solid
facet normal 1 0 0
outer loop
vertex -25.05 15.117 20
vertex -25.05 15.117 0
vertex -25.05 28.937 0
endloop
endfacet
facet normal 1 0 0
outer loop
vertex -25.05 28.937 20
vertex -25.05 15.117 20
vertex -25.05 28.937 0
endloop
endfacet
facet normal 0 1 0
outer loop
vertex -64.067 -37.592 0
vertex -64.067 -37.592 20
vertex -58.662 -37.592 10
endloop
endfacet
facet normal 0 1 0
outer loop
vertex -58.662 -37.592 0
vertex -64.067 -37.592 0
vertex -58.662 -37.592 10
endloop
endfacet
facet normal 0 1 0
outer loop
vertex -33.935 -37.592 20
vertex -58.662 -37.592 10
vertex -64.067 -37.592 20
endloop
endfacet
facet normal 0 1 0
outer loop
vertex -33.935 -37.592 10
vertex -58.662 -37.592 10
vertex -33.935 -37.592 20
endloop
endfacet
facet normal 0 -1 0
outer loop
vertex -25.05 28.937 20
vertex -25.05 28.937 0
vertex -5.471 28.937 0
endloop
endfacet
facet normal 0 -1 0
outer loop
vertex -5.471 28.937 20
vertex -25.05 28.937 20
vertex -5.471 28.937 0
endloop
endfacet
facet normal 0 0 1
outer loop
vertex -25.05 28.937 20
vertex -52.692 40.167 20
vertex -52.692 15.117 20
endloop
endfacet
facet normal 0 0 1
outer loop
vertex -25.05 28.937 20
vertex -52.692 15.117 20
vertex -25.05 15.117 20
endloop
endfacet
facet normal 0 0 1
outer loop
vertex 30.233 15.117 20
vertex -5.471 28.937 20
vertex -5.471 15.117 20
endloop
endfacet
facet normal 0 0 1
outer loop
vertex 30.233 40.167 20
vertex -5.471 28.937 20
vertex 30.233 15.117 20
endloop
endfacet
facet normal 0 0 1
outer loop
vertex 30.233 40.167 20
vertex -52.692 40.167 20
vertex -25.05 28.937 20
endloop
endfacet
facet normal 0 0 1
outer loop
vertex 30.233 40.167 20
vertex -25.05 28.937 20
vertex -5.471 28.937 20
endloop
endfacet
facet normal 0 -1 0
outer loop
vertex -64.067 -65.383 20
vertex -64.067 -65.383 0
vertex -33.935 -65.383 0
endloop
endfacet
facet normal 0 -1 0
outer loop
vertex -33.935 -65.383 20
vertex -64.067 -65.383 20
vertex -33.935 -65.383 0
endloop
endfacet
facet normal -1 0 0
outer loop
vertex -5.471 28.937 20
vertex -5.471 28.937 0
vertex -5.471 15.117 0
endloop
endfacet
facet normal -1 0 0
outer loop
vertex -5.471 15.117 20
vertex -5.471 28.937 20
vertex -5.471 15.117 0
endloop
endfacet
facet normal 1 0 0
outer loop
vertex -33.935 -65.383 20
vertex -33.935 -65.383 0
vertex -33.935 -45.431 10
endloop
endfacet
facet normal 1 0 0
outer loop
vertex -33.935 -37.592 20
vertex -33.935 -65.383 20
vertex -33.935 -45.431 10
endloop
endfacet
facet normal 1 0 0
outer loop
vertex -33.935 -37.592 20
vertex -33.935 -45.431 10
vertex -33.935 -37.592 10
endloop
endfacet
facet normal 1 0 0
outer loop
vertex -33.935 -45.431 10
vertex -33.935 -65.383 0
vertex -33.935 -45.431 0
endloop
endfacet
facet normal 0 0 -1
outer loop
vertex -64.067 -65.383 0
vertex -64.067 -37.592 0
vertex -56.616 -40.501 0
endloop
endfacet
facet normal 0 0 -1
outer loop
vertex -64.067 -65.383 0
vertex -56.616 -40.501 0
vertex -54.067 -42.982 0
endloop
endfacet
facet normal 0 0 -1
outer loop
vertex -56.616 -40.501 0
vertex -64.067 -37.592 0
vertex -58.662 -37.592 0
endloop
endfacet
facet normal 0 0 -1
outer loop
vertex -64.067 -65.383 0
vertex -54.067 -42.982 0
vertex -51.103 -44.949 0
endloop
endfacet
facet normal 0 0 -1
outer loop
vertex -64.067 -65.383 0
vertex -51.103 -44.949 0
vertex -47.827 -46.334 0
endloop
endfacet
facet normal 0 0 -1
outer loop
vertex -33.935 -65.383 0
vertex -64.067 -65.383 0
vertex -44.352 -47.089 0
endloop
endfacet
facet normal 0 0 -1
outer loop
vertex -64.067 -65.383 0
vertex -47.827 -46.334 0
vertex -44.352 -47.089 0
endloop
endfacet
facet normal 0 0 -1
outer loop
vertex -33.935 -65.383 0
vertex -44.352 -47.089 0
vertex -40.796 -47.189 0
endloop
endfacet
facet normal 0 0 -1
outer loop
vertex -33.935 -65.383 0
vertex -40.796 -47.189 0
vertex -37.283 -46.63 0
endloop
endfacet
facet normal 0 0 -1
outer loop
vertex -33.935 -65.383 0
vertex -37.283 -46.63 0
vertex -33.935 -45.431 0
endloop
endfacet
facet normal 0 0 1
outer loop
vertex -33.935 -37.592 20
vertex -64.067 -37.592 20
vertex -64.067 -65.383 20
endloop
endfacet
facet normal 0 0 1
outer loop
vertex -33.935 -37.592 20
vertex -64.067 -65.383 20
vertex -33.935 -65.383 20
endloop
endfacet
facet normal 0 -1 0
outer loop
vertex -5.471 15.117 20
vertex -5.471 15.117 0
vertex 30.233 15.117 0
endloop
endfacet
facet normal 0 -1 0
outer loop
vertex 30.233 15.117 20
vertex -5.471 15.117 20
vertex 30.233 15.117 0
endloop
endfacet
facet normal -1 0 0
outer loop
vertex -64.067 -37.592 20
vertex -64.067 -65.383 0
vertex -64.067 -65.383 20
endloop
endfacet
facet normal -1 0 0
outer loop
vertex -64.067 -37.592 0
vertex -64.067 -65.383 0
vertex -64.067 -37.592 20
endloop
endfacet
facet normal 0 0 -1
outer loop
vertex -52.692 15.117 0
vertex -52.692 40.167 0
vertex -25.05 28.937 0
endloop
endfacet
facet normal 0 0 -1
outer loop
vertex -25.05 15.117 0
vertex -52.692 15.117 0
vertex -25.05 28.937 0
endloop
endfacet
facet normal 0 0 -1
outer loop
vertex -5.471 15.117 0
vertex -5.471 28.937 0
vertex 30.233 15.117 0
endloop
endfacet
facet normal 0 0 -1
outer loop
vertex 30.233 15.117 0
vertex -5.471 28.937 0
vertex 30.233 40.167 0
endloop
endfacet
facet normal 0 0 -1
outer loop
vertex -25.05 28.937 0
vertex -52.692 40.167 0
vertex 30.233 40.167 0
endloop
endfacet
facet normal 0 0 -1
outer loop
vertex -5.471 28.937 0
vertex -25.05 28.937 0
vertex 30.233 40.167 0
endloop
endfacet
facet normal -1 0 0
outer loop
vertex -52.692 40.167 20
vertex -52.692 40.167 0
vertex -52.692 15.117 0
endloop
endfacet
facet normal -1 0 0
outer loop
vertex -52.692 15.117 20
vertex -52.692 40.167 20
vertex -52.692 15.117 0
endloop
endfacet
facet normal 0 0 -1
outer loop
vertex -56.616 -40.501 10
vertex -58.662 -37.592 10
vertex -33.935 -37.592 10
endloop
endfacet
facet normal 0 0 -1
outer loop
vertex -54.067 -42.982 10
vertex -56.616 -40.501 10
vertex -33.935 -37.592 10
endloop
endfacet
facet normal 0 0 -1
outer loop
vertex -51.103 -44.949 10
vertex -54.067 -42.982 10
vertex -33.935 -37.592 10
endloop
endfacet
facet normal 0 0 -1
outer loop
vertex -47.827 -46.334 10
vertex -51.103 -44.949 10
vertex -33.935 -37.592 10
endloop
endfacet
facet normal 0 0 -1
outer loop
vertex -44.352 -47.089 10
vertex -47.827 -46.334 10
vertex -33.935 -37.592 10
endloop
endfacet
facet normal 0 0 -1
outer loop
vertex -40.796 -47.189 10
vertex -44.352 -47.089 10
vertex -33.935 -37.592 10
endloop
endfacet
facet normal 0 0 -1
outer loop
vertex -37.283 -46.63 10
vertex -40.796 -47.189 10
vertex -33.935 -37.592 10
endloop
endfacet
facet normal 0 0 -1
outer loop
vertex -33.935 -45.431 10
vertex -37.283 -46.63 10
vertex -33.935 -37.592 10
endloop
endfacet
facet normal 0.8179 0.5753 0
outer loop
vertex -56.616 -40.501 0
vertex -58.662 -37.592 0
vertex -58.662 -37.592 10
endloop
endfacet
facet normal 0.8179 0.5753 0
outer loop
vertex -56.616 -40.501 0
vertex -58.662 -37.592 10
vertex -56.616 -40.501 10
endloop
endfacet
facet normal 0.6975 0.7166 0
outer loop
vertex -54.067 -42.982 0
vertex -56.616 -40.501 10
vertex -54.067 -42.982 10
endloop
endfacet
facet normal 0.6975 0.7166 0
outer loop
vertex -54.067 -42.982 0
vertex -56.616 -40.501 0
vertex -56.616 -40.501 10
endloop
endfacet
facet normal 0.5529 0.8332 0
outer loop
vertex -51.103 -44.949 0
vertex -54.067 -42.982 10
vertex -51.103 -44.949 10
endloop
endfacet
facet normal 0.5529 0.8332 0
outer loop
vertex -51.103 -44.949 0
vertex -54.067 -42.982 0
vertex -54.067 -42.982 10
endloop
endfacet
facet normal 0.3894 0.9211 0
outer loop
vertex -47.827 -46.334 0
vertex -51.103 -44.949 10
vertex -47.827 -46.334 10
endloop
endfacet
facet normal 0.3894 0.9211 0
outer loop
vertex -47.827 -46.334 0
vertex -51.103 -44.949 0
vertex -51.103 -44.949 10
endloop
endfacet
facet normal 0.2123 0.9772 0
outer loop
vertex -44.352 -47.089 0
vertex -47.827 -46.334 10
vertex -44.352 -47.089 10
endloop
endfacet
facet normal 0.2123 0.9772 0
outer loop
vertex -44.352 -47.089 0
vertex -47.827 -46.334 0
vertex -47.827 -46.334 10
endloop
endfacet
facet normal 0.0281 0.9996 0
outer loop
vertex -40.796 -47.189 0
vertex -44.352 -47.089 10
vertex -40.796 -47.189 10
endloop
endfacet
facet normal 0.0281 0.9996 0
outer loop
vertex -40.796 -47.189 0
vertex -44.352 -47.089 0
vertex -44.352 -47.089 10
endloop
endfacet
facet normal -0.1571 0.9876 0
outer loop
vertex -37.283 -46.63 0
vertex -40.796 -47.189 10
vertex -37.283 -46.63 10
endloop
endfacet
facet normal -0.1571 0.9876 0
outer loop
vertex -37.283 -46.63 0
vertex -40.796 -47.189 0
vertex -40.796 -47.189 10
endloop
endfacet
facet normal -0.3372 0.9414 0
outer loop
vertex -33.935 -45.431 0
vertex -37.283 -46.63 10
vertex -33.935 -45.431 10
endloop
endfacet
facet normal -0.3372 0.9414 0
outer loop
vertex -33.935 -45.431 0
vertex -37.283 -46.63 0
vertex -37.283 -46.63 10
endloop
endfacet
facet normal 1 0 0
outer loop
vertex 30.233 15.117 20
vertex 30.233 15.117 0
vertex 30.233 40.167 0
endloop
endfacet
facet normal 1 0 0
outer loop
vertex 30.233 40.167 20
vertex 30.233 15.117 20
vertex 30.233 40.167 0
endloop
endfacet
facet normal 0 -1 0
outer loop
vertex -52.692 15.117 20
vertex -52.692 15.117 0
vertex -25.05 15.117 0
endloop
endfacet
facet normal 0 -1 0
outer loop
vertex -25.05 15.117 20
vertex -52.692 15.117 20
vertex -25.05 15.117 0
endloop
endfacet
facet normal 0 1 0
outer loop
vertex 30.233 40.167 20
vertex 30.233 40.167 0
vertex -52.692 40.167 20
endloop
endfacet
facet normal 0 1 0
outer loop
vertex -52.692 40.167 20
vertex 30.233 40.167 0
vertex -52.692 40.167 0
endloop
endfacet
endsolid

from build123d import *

# Parameters (mm, degrees)
F1_W     = 30.1317349076
F1_H     = 27.7914069593
F2_DEPTH = 20
F3_R     = 19.1557401368
F4_DEPTH = 10


with BuildPart() as f2:
    # F1 (on Top) → F2 (new body)
    with BuildSketch(Plane.XY):
        with Locations((-49.0006394684, -51.4872390777)):
            Rectangle(F1_W, F1_H)
    extrude(amount=F2_DEPTH)

    # F3 (on Top) → F4 (cut)
    with BuildSketch(Plane.XY):
        with Locations((-42.0383922756, -28.0735846609)):
            Circle(F3_R)
    extrude(amount=F4_DEPTH, mode=Mode.SUBTRACT)


with BuildPart() as f2b:
    # F1 (on Top) → F2, piece 2 (new body)
    with BuildSketch(Plane.XY):
        Polygon((30.2330944687, 40.1668176055), (-52.6919588447, 40.1668176055), (-52.6919588447, 15.1165444404), (-25.0502731651, 15.1165444404), (-25.0502731651, 28.9373882115), (-5.4707499221, 28.9373882115), (-5.4707499221, 15.1165444404), (30.2330944687, 15.1165444404), align=None)
    extrude(amount=F2_DEPTH)


solid = Compound([f2.part, f2b.part])
